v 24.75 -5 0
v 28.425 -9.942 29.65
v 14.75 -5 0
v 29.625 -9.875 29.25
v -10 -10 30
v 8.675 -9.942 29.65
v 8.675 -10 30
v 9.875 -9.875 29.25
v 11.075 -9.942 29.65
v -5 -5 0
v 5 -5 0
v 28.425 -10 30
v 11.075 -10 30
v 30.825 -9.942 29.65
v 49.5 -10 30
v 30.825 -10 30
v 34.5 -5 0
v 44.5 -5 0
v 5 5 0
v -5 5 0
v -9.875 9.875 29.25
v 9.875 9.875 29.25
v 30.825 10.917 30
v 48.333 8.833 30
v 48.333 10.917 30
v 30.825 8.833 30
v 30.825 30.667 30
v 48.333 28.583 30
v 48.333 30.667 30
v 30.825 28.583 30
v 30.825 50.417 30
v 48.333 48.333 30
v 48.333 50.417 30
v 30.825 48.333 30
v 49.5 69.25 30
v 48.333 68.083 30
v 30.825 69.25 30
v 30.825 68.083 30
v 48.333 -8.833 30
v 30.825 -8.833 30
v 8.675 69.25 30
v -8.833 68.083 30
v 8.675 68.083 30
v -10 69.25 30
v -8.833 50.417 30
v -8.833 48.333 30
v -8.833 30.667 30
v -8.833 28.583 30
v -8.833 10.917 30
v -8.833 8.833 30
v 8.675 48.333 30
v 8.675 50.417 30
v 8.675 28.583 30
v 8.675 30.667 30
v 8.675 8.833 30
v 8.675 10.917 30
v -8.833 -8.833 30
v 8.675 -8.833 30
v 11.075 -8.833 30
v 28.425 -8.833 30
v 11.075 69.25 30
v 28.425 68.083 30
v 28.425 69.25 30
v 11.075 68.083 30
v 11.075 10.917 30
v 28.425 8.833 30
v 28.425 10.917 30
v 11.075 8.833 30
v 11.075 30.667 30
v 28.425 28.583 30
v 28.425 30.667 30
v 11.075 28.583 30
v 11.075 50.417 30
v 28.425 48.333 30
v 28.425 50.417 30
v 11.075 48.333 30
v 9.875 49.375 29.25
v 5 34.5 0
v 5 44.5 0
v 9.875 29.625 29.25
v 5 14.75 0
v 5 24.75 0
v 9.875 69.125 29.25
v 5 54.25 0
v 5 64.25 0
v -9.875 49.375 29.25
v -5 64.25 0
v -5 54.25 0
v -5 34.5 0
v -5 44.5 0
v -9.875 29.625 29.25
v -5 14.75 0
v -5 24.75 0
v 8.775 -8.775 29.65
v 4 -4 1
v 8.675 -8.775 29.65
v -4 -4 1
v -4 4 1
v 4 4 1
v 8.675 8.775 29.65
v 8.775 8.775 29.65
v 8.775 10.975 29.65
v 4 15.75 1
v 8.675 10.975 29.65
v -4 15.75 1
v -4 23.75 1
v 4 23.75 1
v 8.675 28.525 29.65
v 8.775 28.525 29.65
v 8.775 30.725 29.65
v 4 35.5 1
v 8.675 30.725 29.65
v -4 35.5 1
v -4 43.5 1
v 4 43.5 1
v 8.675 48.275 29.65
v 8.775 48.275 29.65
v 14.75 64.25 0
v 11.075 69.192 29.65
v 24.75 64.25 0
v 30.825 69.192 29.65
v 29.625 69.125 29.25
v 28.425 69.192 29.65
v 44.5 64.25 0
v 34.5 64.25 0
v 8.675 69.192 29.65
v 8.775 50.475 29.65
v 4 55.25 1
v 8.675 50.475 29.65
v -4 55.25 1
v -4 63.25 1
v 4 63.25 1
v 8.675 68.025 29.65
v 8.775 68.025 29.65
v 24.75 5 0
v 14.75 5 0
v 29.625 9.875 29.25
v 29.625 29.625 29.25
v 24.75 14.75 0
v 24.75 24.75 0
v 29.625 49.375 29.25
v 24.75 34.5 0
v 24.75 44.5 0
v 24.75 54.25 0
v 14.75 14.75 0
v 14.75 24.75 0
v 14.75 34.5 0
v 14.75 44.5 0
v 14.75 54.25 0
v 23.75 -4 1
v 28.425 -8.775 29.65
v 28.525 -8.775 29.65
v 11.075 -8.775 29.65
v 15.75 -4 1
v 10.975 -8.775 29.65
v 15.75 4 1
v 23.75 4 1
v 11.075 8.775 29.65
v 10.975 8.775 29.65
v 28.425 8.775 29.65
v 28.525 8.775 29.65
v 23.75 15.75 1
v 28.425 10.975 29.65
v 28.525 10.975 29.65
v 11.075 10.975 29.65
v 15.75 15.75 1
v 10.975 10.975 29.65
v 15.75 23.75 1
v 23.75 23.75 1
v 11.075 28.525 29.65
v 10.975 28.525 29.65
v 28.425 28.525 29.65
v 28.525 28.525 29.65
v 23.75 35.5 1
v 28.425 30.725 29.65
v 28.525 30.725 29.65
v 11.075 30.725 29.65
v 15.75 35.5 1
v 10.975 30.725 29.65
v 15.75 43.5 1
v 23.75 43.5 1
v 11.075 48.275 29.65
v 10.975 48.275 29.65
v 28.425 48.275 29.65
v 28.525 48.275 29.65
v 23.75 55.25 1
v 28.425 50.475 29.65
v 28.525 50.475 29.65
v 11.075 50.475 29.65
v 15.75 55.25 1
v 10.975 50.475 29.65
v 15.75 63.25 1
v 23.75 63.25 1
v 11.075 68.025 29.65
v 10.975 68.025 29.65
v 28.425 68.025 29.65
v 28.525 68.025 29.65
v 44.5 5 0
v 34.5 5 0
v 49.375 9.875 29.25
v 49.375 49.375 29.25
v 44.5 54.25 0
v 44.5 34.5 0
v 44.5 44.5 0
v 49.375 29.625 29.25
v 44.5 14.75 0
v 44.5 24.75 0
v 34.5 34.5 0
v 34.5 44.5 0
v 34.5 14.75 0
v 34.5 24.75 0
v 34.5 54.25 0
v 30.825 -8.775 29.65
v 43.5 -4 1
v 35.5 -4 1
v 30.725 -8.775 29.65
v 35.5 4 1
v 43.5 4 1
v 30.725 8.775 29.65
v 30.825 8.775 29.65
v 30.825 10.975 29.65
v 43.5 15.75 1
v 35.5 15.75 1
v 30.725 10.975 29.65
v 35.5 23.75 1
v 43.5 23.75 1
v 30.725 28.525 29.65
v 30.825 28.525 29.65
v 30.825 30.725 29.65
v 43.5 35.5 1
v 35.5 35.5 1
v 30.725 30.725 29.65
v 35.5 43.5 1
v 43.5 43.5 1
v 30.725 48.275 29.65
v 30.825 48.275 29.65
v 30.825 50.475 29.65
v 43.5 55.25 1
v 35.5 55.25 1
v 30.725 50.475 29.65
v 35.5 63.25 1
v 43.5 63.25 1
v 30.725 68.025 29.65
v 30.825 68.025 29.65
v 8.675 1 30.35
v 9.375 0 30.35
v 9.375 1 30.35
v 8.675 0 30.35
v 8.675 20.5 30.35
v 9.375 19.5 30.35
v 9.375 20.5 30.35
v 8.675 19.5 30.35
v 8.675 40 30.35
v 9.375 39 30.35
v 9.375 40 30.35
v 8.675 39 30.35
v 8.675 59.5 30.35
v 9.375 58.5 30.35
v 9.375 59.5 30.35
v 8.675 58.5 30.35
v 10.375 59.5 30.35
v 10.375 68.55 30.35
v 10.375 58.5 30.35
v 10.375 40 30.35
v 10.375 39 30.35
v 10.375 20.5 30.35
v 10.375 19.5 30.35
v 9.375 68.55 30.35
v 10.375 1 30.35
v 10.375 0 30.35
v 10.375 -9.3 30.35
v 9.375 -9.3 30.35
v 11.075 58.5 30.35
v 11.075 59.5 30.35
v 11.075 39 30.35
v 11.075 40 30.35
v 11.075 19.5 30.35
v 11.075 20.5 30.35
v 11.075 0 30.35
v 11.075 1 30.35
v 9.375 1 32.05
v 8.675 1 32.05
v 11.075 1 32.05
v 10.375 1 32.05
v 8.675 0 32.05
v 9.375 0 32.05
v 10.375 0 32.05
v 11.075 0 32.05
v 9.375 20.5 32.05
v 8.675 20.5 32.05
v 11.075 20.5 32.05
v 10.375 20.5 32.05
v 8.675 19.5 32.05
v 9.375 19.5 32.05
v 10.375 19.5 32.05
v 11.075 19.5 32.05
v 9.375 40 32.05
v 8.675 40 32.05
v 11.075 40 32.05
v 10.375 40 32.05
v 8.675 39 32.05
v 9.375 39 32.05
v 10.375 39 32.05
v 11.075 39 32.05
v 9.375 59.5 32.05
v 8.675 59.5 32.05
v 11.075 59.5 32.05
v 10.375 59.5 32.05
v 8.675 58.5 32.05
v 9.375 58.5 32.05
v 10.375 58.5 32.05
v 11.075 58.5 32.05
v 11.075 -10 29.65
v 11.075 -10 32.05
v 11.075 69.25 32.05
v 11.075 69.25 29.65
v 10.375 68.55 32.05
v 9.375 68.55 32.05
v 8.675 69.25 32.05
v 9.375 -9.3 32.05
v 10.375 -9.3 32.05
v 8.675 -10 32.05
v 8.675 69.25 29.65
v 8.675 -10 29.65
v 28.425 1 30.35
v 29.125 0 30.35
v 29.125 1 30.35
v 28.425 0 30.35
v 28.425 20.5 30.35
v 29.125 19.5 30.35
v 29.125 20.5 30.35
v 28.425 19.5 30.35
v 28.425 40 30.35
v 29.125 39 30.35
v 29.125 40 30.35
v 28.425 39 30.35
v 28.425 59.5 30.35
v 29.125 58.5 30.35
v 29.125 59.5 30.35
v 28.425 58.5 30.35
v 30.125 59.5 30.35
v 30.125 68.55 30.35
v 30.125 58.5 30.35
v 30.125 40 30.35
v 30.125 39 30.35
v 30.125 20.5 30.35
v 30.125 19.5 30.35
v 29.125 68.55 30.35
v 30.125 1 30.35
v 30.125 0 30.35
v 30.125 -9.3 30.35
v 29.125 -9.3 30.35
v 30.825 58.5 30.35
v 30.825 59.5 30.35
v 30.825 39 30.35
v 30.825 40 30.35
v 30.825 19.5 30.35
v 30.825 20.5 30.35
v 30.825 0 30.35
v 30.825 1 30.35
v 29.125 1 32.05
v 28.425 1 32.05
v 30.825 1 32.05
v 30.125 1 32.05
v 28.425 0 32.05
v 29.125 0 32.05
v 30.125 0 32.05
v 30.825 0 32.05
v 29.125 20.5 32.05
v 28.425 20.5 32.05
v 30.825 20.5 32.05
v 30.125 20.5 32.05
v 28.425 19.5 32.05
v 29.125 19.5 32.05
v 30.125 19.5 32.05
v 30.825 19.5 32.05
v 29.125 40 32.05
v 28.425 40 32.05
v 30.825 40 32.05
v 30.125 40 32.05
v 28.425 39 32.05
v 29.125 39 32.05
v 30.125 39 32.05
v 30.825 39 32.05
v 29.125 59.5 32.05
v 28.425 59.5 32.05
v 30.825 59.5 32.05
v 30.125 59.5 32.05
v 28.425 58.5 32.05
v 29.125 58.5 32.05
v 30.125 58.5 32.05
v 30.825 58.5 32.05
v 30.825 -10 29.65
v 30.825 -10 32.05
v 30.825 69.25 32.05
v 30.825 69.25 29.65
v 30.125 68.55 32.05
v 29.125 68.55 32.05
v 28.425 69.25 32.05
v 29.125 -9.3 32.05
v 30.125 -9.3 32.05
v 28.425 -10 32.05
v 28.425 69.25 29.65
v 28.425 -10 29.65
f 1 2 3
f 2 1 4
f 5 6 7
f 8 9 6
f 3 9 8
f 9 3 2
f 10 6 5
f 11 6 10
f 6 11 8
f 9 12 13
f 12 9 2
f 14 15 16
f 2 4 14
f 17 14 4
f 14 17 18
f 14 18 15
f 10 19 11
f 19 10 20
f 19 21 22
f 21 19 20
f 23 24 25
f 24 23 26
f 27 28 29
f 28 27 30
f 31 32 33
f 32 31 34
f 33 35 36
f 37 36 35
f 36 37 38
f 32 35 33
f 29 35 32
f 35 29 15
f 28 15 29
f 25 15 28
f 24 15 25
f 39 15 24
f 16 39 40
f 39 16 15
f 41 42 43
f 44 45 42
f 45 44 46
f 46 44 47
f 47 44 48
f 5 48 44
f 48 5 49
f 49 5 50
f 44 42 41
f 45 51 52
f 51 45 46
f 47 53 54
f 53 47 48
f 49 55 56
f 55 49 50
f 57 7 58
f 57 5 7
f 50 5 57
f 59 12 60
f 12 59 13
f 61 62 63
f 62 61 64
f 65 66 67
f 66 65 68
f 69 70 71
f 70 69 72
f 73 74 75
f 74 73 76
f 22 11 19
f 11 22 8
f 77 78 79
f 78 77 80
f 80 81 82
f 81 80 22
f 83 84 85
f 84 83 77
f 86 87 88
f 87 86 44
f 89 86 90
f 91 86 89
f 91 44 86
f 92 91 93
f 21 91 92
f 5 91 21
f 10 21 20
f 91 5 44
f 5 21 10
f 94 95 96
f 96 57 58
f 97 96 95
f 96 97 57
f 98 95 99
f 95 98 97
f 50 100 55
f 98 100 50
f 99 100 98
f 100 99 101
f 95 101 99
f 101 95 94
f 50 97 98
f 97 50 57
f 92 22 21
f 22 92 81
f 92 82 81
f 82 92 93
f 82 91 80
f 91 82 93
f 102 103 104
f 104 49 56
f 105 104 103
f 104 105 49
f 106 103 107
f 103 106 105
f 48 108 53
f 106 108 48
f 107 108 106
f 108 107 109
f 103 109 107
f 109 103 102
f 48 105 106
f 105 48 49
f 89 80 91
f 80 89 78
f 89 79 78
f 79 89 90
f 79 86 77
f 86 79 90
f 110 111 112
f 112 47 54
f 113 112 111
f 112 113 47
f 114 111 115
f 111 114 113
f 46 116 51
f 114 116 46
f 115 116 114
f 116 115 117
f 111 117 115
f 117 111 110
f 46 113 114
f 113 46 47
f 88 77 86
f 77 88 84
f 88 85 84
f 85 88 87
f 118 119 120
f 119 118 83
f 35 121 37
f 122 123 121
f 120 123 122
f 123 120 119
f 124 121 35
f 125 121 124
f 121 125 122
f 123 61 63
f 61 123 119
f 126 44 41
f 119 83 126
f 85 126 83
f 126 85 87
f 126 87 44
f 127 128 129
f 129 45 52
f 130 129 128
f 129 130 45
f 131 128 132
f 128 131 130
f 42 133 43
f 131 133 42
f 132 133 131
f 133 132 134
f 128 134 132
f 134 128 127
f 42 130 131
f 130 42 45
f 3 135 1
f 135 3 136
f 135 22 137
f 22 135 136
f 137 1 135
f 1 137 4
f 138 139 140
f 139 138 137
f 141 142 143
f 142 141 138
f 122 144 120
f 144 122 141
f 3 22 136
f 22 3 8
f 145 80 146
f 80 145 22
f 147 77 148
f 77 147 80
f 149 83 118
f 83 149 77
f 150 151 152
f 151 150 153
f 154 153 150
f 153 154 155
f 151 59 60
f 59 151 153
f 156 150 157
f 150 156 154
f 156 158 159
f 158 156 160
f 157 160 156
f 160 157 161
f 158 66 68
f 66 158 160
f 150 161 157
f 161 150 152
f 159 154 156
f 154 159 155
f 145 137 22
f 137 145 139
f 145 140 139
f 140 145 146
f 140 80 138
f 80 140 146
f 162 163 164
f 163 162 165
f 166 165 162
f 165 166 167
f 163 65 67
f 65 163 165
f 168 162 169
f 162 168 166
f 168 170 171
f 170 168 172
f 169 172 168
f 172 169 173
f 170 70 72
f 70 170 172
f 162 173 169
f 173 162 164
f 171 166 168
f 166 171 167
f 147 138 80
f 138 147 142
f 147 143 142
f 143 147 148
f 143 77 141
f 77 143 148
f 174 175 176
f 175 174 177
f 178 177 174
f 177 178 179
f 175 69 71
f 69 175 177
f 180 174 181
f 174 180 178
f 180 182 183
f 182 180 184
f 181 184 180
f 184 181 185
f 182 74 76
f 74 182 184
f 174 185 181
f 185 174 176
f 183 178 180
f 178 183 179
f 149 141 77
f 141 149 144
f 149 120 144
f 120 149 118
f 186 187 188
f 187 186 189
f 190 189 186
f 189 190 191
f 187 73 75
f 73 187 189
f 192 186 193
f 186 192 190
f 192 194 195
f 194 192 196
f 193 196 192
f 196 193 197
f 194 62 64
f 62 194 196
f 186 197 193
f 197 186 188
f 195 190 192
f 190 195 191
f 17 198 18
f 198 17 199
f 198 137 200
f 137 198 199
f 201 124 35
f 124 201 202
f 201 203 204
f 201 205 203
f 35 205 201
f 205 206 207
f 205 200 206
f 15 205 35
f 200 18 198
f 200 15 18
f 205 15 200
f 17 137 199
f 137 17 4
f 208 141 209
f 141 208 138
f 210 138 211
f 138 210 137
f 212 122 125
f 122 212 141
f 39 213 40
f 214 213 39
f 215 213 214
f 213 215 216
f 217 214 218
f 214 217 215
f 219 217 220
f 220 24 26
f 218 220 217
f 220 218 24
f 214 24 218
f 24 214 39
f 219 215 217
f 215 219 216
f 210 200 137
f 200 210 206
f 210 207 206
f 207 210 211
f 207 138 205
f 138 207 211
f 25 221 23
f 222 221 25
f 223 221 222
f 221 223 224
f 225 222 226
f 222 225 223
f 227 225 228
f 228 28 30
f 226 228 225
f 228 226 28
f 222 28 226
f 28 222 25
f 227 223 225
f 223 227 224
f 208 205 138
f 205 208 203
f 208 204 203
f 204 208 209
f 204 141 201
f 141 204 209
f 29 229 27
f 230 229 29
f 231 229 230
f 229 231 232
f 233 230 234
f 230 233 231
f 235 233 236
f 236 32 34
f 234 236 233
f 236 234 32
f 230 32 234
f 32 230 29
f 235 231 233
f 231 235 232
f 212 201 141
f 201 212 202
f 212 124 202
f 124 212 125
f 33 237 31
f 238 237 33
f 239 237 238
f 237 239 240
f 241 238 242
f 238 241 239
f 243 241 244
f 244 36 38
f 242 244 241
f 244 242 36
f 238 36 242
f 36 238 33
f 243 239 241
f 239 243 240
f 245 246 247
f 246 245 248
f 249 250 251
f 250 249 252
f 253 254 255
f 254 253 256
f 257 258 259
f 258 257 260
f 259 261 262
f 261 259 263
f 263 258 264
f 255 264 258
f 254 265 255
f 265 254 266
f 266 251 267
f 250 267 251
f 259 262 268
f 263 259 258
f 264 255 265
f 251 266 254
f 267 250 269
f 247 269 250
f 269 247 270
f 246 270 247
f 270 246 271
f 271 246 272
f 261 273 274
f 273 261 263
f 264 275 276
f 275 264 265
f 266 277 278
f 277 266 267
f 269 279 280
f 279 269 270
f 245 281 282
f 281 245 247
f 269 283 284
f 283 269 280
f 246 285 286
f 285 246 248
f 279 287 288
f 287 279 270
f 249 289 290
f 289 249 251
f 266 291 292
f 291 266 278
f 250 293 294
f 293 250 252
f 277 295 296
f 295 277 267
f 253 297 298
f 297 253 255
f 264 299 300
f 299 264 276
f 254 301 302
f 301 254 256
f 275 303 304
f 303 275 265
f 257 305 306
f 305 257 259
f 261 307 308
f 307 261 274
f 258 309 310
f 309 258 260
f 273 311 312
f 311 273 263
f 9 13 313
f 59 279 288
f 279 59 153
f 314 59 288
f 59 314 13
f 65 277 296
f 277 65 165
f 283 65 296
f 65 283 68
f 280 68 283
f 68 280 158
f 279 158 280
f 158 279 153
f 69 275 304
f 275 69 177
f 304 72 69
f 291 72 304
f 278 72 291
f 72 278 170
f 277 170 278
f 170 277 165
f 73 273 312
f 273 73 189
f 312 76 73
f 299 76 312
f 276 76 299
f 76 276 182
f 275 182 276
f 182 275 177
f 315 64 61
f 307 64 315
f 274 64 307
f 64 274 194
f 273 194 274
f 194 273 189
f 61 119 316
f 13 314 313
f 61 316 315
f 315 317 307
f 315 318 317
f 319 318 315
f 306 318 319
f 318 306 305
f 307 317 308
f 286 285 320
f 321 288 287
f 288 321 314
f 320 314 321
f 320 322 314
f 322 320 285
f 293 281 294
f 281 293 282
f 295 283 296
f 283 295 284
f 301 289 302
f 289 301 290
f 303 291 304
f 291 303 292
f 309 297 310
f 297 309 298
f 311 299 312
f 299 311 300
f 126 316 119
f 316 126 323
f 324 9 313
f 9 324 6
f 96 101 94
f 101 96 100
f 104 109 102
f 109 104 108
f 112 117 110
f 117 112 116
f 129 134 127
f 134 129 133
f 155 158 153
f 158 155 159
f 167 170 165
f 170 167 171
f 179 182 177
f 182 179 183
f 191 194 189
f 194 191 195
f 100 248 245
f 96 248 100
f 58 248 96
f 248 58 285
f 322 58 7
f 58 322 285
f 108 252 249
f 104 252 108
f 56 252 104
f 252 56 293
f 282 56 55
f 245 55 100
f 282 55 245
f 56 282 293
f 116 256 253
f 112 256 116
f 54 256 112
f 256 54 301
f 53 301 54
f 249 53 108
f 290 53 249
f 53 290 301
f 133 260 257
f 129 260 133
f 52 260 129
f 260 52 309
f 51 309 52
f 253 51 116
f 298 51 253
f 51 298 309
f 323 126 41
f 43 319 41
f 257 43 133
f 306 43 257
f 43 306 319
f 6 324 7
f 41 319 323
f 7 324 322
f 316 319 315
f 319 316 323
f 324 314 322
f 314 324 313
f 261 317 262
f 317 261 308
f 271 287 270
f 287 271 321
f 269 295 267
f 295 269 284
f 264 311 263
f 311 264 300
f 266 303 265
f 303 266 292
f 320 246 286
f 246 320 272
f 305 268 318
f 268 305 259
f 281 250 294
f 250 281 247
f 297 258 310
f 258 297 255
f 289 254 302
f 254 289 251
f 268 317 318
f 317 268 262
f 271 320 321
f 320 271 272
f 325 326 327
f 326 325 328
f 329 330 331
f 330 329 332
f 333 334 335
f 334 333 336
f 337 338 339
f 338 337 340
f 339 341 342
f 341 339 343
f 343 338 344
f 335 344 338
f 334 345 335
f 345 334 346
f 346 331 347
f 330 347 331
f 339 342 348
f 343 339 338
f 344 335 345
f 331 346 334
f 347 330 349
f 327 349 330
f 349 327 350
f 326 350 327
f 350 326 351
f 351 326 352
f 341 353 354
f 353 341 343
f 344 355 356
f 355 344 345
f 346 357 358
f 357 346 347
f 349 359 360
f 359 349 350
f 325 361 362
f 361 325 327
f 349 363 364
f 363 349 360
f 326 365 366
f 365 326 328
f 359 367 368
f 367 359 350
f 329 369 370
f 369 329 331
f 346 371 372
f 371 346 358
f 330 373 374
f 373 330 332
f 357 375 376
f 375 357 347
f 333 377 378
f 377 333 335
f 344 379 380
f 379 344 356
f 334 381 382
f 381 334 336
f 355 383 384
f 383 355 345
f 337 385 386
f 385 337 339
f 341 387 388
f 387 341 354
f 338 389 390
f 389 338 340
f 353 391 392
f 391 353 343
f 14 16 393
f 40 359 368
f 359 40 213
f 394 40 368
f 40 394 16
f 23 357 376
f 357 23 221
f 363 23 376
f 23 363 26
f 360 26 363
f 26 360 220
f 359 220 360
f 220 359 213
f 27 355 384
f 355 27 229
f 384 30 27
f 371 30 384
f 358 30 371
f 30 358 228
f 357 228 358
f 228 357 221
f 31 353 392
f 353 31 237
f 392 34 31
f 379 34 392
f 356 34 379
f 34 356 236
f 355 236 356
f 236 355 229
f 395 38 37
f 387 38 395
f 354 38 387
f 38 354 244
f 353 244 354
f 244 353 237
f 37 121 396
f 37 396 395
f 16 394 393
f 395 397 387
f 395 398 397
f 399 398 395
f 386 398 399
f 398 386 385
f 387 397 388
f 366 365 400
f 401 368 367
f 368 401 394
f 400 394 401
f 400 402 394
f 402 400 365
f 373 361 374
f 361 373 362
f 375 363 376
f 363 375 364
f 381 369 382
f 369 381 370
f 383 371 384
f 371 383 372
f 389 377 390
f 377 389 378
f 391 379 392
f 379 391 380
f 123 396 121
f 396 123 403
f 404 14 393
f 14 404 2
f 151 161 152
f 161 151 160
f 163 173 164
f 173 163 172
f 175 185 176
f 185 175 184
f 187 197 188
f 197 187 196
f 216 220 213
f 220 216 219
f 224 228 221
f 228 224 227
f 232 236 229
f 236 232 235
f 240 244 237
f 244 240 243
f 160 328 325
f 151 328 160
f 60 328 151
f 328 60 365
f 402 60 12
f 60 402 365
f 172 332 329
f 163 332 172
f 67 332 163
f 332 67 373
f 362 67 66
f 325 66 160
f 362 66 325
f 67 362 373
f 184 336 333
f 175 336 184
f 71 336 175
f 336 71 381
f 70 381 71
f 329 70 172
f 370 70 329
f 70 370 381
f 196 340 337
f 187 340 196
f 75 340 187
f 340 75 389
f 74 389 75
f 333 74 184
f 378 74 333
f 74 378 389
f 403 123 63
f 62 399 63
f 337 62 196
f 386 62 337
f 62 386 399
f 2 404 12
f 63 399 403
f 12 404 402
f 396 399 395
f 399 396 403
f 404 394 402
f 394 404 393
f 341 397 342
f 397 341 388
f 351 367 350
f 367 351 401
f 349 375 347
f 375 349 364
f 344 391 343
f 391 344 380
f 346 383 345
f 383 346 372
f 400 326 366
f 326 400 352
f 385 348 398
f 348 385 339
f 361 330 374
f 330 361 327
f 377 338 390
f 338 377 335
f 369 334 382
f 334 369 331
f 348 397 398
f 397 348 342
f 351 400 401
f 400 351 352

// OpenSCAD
/* [General] */
Thickness = 1;
ModuleSideSizeTop=20;
ModuleSideSizeBottom=10;
ModuleHeight = 30;
NumberModulesX = 3;
NumberModulesY = 4;

/* [Water] */
ScapeHole = "false"; //[true, false]
ScapeHoleDiameter = 1.5;
IrrigationSystem = "true"; //[true, false]
IrrigationSystemSize = 2.4;
IrrigationSystemThickness = 0.7;

/* [HIDDEN] */
sqr2 = sqrt(2);
$fn=30;

vase();

module vase(){
    tkDiv = 4;
    stepX = ModuleSideSizeTop-Thickness/tkDiv;
    stepY = ModuleSideSizeTop-Thickness/tkDiv;
    for(x=[0:NumberModulesX-1])
        for(y=[0:NumberModulesY-1])
            translate([x*stepX,
                       y*stepY])
                modulo();
    if(IrrigationSystem == "true"){
        translate([Thickness/2/tkDiv,0,-IrrigationSystemThickness/2])
        for(x=[1:NumberModulesX-1])
            translate([x*stepX-IrrigationSystemSize/2-
                        ModuleSideSizeTop/2,
                       -ModuleSideSizeTop/2,ModuleHeight])
                difference(){
                    iySize = NumberModulesY*stepY+Thickness/tkDiv;
                    cube([IrrigationSystemSize,
                          iySize,
                          IrrigationSystemSize]);
                    translate([IrrigationSystemThickness,
                               IrrigationSystemThickness,
                               IrrigationSystemThickness])
                        cube([IrrigationSystemSize-IrrigationSystemThickness*2,
                              iySize-IrrigationSystemThickness*2,
                              IrrigationSystemSize]);
                    for(y=[0:NumberModulesY-1]){
                        translate([-IrrigationSystemSize/2,
                                  y*(ModuleSideSizeTop-Thickness/2)+ModuleSideSizeTop/2,
                                  IrrigationSystemThickness]) 
                            cube([IrrigationSystemSize*2,Thickness,IrrigationSystemSize*2]);
                    }
                }
    }
}
module modulo(){
    rotate(a=[0,0,45]) difference(){ 
        cylinder(d1=ModuleSideSizeBottom*sqr2,d2=ModuleSideSizeTop*sqr2,h=ModuleHeight,$fn=4);
        translate([0,0,Thickness]) 
            cylinder(d1=(ModuleSideSizeBottom-Thickness*2)*sqr2,
                     d2=(ModuleSideSizeTop-Thickness*2)*sqr2,h=ModuleHeight,$fn=4);
        if(ScapeHole == "true"){
            cylinder(d=ScapeHoleDiameter,h=Thickness*3,center=true);
        }
    }
}
